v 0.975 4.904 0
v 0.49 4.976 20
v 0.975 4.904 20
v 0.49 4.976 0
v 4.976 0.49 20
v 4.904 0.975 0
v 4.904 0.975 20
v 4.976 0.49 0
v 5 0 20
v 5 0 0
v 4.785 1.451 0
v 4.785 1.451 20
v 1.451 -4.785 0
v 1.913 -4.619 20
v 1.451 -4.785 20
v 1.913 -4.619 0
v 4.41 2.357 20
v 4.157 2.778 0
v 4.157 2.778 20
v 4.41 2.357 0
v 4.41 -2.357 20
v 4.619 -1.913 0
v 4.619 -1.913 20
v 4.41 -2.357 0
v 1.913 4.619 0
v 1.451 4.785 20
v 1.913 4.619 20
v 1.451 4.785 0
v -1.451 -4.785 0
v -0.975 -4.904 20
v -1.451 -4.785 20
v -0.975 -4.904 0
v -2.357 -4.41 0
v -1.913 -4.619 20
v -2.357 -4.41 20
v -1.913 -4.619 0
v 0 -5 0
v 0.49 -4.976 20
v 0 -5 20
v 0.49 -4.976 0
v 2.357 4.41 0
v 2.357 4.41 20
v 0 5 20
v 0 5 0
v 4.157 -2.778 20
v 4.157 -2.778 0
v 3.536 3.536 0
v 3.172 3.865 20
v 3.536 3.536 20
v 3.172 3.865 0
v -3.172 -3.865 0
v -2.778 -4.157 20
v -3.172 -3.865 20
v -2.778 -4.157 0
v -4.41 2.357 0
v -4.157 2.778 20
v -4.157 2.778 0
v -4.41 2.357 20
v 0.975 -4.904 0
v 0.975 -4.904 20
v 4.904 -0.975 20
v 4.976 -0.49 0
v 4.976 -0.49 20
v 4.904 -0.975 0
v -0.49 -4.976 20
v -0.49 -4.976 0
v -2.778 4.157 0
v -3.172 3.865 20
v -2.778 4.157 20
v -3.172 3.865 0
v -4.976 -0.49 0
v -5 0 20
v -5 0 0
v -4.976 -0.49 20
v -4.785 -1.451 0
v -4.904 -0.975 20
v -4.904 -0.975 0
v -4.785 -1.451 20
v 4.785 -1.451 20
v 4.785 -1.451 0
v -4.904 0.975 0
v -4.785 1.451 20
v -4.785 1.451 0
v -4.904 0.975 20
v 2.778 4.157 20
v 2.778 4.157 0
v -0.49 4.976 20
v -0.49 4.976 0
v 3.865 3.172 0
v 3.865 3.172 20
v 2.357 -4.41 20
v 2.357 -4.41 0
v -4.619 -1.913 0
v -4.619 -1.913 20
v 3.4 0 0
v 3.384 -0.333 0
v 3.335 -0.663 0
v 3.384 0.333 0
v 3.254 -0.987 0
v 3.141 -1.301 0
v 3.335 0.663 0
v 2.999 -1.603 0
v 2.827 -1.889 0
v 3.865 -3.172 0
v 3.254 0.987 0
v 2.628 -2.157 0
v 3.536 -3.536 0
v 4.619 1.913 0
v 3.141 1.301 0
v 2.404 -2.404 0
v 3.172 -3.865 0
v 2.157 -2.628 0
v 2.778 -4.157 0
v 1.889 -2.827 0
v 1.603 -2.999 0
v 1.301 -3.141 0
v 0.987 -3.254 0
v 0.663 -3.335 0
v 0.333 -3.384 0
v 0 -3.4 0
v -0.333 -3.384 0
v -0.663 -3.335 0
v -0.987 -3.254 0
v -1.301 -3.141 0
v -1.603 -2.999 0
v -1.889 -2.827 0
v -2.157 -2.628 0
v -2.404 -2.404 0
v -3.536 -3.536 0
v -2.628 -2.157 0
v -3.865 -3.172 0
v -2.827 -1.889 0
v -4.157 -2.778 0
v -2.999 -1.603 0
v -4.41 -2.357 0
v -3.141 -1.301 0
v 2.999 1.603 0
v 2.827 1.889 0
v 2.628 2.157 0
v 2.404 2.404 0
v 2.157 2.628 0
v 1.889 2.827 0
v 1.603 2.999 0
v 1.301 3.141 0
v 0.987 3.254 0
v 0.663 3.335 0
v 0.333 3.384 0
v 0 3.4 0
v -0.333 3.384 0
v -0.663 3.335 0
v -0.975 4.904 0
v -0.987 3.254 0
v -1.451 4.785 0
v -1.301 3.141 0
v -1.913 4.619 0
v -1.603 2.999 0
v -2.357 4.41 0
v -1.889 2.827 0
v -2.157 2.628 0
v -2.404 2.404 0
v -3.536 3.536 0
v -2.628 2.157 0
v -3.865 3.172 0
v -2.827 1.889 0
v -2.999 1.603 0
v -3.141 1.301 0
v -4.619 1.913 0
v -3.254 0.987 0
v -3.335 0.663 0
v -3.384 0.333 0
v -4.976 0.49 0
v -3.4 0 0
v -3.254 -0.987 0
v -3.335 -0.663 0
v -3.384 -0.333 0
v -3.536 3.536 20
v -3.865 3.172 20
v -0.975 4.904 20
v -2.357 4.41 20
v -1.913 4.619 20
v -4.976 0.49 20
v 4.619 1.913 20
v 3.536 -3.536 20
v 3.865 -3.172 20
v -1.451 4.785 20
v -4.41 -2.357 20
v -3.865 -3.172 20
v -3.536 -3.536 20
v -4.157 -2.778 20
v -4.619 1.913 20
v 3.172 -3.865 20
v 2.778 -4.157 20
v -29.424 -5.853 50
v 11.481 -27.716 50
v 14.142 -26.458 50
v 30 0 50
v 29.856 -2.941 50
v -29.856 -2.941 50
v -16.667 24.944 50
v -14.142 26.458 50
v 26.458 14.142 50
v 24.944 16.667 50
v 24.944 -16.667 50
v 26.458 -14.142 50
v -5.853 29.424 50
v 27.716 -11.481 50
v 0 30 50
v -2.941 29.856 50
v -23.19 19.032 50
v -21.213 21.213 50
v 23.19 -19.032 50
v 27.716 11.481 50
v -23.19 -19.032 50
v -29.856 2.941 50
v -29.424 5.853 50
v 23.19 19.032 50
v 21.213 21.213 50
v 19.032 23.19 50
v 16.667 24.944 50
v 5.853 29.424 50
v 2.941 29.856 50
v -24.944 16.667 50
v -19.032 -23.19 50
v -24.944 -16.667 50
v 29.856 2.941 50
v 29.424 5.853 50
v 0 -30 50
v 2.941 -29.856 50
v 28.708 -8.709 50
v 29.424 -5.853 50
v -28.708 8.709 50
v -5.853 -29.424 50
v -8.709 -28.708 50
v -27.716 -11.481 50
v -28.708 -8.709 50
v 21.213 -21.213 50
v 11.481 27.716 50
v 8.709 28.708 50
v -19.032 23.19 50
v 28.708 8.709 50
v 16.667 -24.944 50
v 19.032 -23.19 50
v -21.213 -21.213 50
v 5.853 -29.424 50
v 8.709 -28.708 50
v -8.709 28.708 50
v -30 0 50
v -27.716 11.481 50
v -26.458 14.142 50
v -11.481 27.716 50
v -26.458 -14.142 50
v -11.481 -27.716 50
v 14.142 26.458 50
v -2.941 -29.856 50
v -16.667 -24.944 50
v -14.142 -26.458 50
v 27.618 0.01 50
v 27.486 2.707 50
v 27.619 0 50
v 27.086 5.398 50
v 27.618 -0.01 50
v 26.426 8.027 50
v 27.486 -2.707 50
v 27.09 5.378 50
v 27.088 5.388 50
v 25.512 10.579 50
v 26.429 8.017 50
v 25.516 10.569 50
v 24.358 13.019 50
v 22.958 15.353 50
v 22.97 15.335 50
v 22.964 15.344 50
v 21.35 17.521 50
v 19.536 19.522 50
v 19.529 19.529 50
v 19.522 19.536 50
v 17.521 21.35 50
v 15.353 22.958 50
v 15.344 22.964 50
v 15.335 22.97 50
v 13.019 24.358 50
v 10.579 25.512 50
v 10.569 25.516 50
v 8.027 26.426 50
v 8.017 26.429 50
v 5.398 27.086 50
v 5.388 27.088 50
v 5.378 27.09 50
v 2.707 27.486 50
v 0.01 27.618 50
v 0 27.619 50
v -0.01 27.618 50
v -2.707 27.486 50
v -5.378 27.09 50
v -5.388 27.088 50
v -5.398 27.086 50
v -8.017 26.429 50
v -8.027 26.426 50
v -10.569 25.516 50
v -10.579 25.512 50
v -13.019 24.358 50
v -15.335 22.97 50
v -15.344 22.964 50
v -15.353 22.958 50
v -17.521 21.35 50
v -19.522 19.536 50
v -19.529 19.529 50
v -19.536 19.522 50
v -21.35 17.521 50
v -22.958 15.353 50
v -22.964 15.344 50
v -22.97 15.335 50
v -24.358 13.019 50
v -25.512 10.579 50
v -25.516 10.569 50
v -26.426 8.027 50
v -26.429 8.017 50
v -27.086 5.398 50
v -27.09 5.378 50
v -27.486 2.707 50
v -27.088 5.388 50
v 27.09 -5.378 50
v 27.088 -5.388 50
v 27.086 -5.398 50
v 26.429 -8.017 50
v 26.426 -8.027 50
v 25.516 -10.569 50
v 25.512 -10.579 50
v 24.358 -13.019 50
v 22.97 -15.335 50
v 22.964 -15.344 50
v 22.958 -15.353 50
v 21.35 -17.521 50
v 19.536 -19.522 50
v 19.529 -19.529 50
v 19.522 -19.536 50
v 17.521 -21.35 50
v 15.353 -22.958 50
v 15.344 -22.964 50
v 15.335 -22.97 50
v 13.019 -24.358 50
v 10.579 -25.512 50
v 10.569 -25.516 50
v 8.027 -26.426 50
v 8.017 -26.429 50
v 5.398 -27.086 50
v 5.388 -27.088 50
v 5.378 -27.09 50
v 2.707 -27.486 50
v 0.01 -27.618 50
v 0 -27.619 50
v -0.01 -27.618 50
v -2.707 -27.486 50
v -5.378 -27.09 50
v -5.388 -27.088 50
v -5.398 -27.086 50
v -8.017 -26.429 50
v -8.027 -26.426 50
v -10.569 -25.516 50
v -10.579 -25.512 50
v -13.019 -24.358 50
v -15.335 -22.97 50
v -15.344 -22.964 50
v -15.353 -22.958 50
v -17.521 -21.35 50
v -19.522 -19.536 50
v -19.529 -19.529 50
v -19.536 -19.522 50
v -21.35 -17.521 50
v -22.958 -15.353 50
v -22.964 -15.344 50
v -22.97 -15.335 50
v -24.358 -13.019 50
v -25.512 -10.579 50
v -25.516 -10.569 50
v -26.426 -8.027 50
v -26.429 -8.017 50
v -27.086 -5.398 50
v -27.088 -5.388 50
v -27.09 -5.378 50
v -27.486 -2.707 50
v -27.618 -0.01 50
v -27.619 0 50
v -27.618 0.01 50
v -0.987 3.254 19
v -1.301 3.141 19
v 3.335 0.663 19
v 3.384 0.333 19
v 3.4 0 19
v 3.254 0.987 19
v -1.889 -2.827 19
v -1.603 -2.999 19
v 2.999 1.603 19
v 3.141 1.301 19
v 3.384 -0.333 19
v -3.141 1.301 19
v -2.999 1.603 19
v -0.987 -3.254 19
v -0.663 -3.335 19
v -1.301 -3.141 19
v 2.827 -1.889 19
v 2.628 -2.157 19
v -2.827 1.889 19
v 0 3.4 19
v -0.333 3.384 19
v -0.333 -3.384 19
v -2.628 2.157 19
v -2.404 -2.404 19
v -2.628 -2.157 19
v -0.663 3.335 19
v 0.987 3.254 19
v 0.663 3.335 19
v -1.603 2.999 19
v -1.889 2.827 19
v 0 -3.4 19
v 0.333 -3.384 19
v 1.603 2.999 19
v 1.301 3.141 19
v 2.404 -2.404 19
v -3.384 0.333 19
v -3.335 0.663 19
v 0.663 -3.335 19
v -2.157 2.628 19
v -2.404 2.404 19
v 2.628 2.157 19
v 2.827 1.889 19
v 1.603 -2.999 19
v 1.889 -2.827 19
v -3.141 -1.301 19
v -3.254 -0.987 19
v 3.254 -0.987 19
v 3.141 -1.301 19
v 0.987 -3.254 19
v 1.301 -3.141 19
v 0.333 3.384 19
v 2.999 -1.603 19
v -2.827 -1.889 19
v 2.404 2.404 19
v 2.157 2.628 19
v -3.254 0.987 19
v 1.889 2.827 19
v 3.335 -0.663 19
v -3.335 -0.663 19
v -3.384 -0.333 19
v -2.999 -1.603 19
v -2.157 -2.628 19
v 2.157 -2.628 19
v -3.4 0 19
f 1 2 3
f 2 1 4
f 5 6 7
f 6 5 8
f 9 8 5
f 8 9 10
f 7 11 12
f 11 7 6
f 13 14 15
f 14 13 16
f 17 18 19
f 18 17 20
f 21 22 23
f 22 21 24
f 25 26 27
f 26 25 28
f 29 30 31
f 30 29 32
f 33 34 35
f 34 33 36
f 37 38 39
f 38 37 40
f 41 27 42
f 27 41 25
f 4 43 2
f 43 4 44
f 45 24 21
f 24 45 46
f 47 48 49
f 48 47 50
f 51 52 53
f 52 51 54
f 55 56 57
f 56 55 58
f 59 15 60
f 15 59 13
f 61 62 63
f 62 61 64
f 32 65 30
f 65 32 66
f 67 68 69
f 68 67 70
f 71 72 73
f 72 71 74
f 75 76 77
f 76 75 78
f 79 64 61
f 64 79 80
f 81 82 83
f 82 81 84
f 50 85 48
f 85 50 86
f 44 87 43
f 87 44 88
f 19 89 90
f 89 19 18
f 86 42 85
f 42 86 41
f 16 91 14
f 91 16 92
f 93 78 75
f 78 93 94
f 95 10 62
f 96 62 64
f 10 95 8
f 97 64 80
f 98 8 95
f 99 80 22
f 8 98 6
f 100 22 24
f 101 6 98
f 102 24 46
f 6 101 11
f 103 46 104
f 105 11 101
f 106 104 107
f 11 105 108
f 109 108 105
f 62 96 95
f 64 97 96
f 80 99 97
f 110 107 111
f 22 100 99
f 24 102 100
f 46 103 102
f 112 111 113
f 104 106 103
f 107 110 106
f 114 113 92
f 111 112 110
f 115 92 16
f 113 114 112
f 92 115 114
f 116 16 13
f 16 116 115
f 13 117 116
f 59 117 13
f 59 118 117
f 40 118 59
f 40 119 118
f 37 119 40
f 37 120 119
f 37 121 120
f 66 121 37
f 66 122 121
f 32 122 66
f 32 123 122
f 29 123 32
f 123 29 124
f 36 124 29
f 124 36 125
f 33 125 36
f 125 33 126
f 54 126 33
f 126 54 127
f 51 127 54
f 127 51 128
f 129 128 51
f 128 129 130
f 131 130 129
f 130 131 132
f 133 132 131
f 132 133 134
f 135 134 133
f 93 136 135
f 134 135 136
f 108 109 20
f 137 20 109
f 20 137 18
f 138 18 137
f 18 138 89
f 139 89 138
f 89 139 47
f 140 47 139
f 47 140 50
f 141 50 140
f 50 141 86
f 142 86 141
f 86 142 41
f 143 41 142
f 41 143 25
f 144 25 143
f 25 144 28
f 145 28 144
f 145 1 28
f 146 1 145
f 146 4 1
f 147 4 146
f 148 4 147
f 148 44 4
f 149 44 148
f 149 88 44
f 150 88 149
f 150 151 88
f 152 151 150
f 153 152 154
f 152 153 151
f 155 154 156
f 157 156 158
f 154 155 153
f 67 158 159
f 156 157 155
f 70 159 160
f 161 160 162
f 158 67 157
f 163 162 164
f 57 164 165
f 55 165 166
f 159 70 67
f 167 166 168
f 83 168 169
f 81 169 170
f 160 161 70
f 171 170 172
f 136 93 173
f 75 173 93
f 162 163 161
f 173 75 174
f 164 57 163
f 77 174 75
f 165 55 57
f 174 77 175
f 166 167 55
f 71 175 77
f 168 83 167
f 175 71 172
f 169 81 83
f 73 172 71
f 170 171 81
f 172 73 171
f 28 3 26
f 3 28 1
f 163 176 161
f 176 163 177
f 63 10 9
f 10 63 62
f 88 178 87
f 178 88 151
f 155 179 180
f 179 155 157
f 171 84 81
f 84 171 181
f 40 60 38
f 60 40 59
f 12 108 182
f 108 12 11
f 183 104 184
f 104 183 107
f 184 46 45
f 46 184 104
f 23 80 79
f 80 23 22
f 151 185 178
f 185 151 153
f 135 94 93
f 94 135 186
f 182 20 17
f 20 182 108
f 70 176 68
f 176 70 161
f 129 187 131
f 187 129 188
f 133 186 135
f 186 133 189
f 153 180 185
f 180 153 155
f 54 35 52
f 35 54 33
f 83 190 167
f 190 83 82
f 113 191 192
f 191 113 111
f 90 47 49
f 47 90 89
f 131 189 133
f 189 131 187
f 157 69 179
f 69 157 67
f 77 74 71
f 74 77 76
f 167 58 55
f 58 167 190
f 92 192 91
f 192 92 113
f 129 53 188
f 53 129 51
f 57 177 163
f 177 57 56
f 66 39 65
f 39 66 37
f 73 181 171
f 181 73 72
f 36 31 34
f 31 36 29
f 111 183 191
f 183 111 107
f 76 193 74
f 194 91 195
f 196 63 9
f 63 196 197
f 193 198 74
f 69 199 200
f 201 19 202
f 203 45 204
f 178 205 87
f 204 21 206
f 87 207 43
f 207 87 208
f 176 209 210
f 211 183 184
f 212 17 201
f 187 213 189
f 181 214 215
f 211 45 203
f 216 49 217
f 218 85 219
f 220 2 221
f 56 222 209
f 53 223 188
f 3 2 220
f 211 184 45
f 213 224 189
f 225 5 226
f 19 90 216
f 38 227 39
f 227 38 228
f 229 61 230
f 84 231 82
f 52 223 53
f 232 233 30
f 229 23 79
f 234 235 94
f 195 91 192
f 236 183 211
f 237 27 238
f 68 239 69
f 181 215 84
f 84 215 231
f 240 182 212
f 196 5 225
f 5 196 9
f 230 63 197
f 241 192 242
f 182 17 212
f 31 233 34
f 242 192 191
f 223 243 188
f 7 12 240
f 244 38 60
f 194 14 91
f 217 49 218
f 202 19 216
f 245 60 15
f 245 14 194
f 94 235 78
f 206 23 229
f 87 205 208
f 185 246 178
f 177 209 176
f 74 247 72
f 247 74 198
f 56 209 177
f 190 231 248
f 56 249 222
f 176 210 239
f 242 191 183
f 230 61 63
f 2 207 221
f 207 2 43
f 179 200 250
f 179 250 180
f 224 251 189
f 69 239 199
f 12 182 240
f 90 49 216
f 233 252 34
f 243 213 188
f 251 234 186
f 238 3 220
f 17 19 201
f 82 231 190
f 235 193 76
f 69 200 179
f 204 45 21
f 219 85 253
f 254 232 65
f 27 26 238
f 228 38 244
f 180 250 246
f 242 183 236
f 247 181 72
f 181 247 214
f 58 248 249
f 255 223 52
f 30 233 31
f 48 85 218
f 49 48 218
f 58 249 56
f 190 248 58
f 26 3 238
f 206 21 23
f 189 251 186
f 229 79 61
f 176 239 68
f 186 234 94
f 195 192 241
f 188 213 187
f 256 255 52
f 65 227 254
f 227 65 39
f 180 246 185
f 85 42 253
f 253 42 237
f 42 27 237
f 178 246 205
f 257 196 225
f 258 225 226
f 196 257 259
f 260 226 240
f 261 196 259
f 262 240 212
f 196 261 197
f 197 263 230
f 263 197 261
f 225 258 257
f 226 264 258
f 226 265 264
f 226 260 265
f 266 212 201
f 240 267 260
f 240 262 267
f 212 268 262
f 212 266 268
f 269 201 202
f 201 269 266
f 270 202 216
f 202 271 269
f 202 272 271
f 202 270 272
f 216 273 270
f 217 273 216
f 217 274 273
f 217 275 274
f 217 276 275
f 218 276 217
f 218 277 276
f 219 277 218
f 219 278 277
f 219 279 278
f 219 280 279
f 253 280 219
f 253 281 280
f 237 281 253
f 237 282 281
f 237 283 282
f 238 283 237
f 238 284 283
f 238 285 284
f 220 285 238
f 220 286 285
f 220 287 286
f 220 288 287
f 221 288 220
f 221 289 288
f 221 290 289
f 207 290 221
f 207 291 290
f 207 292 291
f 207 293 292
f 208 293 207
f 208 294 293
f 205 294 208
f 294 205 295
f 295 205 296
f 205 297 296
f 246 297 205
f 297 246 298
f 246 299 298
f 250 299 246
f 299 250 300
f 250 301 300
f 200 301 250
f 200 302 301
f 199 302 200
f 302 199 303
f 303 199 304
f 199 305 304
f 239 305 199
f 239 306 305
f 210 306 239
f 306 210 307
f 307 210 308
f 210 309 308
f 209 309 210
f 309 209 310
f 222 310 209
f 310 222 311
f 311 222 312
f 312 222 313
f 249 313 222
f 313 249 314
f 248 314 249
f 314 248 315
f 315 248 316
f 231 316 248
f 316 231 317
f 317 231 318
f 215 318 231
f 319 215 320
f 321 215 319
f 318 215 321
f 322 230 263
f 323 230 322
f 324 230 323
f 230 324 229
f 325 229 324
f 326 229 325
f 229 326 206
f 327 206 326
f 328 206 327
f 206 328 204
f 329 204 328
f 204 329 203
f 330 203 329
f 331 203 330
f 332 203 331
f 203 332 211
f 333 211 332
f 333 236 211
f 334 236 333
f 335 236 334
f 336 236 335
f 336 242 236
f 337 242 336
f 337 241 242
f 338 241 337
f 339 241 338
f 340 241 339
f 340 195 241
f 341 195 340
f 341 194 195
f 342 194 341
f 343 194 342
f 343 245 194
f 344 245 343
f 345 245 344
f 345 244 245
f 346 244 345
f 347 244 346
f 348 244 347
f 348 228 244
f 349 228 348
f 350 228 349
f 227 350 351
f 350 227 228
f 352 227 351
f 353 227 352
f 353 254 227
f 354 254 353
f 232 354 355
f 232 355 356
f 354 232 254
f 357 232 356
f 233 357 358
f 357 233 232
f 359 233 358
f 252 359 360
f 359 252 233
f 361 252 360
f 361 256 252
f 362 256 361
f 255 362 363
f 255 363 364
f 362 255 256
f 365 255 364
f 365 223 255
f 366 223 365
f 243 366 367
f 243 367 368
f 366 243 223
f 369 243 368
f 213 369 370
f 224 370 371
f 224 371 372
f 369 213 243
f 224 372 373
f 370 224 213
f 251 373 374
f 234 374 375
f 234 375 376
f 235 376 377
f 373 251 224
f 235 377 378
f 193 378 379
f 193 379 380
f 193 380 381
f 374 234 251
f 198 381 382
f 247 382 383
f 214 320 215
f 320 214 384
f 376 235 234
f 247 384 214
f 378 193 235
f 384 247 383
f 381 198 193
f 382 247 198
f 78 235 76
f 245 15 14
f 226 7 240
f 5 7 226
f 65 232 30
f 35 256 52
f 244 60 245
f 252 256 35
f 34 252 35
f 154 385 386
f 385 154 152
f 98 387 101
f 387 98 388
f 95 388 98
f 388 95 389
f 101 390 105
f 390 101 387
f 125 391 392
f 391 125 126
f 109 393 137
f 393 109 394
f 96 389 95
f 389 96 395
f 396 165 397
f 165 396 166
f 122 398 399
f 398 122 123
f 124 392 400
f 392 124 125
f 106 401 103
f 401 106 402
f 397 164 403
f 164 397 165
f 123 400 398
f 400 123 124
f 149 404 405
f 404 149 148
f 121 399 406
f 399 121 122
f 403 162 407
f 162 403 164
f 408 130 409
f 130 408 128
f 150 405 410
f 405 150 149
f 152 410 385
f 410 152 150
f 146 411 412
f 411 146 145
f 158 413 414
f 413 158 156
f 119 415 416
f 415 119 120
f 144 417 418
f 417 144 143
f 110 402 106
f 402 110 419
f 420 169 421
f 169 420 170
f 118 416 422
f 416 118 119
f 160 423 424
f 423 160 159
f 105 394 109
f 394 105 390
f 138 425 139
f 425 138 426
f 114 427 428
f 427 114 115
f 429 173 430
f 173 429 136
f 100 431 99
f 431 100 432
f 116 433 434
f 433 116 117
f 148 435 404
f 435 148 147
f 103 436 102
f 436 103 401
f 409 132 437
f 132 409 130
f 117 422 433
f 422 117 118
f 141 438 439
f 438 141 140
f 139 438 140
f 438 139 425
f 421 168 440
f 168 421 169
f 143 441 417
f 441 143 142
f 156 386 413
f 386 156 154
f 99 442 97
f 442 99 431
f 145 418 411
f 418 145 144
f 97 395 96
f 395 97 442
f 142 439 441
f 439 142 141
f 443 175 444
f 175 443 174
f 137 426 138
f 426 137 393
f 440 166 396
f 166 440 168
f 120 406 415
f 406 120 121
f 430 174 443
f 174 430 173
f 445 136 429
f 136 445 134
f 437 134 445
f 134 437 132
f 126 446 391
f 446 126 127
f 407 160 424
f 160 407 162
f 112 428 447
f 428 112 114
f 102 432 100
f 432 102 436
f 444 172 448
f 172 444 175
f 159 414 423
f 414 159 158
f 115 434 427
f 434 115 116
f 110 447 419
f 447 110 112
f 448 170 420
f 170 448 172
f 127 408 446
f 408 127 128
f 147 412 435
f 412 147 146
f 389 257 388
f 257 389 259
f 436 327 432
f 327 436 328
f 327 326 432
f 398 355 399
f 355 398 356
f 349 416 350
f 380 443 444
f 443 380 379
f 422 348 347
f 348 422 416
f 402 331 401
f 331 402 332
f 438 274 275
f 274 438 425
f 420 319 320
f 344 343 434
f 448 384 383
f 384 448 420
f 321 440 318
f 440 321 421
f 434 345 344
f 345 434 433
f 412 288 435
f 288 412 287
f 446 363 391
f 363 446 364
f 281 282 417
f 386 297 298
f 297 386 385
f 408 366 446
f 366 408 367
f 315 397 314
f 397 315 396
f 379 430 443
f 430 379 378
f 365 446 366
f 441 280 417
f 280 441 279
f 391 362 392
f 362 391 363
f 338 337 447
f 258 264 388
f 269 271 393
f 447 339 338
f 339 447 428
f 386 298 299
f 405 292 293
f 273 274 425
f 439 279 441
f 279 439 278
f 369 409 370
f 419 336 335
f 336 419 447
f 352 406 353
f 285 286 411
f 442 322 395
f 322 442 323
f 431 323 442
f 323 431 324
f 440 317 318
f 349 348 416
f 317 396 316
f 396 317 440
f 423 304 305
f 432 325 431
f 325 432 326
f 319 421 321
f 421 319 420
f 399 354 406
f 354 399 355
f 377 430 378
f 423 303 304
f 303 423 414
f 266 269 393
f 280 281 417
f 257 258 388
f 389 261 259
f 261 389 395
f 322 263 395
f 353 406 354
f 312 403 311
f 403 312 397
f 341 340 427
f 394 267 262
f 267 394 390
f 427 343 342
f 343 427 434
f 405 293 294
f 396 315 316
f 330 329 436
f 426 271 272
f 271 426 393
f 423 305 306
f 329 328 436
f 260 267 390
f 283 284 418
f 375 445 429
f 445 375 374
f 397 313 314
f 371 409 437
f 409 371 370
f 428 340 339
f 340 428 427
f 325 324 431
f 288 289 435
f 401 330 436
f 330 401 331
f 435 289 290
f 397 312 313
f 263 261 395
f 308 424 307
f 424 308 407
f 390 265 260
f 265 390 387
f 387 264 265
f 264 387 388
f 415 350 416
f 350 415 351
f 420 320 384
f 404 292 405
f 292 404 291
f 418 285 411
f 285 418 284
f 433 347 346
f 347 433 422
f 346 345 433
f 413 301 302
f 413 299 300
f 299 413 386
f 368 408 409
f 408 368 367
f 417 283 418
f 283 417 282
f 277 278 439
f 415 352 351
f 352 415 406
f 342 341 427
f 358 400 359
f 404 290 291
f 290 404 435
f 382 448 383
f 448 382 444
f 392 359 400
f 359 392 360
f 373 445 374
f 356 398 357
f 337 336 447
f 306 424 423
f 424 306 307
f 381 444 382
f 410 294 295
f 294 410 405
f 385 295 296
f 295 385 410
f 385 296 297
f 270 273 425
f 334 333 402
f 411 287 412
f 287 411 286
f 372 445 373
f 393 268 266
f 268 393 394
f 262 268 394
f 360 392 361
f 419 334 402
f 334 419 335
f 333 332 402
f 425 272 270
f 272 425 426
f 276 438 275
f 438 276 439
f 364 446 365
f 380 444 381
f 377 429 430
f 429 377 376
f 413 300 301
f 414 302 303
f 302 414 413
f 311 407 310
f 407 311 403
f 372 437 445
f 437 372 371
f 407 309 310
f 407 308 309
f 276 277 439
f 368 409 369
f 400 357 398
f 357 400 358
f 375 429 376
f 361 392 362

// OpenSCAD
// Funnel - a straight spout (tube) with a conical bowl, open at both ends, for pouring
// liquids in the lab. NOVEL general part.
//

spout_d = 10;
spout_l = 20;
cone_d  = 60;
rim     = 50;
wall    = 1.6;

$fn = 64;

ib = spout_d - 2 * wall;   // bore of the spout

difference() {
    union() {
        cylinder(h = spout_l, d = spout_d);          // spout
        translate([0, 0, spout_l]) cylinder(h = 30, d1 = spout_d, d2 = cone_d);  // cone (flared end)
        translate([0, 0, spout_l]) cylinder(h = 30, d1 = ib, d2 = cone_d - 2 * wall);  // inner space (flared bore)
    }
    translate([0, 0, -1]) cylinder(h = spout_l + 2, d = spout_d - 2 * wall);           // bore through the spout
    translate([0, 0, spout_l - 1]) cylinder(h = 32, d1 = ib, d2 = cone_d - 2 * wall);  // inner space (flared bore)
}
